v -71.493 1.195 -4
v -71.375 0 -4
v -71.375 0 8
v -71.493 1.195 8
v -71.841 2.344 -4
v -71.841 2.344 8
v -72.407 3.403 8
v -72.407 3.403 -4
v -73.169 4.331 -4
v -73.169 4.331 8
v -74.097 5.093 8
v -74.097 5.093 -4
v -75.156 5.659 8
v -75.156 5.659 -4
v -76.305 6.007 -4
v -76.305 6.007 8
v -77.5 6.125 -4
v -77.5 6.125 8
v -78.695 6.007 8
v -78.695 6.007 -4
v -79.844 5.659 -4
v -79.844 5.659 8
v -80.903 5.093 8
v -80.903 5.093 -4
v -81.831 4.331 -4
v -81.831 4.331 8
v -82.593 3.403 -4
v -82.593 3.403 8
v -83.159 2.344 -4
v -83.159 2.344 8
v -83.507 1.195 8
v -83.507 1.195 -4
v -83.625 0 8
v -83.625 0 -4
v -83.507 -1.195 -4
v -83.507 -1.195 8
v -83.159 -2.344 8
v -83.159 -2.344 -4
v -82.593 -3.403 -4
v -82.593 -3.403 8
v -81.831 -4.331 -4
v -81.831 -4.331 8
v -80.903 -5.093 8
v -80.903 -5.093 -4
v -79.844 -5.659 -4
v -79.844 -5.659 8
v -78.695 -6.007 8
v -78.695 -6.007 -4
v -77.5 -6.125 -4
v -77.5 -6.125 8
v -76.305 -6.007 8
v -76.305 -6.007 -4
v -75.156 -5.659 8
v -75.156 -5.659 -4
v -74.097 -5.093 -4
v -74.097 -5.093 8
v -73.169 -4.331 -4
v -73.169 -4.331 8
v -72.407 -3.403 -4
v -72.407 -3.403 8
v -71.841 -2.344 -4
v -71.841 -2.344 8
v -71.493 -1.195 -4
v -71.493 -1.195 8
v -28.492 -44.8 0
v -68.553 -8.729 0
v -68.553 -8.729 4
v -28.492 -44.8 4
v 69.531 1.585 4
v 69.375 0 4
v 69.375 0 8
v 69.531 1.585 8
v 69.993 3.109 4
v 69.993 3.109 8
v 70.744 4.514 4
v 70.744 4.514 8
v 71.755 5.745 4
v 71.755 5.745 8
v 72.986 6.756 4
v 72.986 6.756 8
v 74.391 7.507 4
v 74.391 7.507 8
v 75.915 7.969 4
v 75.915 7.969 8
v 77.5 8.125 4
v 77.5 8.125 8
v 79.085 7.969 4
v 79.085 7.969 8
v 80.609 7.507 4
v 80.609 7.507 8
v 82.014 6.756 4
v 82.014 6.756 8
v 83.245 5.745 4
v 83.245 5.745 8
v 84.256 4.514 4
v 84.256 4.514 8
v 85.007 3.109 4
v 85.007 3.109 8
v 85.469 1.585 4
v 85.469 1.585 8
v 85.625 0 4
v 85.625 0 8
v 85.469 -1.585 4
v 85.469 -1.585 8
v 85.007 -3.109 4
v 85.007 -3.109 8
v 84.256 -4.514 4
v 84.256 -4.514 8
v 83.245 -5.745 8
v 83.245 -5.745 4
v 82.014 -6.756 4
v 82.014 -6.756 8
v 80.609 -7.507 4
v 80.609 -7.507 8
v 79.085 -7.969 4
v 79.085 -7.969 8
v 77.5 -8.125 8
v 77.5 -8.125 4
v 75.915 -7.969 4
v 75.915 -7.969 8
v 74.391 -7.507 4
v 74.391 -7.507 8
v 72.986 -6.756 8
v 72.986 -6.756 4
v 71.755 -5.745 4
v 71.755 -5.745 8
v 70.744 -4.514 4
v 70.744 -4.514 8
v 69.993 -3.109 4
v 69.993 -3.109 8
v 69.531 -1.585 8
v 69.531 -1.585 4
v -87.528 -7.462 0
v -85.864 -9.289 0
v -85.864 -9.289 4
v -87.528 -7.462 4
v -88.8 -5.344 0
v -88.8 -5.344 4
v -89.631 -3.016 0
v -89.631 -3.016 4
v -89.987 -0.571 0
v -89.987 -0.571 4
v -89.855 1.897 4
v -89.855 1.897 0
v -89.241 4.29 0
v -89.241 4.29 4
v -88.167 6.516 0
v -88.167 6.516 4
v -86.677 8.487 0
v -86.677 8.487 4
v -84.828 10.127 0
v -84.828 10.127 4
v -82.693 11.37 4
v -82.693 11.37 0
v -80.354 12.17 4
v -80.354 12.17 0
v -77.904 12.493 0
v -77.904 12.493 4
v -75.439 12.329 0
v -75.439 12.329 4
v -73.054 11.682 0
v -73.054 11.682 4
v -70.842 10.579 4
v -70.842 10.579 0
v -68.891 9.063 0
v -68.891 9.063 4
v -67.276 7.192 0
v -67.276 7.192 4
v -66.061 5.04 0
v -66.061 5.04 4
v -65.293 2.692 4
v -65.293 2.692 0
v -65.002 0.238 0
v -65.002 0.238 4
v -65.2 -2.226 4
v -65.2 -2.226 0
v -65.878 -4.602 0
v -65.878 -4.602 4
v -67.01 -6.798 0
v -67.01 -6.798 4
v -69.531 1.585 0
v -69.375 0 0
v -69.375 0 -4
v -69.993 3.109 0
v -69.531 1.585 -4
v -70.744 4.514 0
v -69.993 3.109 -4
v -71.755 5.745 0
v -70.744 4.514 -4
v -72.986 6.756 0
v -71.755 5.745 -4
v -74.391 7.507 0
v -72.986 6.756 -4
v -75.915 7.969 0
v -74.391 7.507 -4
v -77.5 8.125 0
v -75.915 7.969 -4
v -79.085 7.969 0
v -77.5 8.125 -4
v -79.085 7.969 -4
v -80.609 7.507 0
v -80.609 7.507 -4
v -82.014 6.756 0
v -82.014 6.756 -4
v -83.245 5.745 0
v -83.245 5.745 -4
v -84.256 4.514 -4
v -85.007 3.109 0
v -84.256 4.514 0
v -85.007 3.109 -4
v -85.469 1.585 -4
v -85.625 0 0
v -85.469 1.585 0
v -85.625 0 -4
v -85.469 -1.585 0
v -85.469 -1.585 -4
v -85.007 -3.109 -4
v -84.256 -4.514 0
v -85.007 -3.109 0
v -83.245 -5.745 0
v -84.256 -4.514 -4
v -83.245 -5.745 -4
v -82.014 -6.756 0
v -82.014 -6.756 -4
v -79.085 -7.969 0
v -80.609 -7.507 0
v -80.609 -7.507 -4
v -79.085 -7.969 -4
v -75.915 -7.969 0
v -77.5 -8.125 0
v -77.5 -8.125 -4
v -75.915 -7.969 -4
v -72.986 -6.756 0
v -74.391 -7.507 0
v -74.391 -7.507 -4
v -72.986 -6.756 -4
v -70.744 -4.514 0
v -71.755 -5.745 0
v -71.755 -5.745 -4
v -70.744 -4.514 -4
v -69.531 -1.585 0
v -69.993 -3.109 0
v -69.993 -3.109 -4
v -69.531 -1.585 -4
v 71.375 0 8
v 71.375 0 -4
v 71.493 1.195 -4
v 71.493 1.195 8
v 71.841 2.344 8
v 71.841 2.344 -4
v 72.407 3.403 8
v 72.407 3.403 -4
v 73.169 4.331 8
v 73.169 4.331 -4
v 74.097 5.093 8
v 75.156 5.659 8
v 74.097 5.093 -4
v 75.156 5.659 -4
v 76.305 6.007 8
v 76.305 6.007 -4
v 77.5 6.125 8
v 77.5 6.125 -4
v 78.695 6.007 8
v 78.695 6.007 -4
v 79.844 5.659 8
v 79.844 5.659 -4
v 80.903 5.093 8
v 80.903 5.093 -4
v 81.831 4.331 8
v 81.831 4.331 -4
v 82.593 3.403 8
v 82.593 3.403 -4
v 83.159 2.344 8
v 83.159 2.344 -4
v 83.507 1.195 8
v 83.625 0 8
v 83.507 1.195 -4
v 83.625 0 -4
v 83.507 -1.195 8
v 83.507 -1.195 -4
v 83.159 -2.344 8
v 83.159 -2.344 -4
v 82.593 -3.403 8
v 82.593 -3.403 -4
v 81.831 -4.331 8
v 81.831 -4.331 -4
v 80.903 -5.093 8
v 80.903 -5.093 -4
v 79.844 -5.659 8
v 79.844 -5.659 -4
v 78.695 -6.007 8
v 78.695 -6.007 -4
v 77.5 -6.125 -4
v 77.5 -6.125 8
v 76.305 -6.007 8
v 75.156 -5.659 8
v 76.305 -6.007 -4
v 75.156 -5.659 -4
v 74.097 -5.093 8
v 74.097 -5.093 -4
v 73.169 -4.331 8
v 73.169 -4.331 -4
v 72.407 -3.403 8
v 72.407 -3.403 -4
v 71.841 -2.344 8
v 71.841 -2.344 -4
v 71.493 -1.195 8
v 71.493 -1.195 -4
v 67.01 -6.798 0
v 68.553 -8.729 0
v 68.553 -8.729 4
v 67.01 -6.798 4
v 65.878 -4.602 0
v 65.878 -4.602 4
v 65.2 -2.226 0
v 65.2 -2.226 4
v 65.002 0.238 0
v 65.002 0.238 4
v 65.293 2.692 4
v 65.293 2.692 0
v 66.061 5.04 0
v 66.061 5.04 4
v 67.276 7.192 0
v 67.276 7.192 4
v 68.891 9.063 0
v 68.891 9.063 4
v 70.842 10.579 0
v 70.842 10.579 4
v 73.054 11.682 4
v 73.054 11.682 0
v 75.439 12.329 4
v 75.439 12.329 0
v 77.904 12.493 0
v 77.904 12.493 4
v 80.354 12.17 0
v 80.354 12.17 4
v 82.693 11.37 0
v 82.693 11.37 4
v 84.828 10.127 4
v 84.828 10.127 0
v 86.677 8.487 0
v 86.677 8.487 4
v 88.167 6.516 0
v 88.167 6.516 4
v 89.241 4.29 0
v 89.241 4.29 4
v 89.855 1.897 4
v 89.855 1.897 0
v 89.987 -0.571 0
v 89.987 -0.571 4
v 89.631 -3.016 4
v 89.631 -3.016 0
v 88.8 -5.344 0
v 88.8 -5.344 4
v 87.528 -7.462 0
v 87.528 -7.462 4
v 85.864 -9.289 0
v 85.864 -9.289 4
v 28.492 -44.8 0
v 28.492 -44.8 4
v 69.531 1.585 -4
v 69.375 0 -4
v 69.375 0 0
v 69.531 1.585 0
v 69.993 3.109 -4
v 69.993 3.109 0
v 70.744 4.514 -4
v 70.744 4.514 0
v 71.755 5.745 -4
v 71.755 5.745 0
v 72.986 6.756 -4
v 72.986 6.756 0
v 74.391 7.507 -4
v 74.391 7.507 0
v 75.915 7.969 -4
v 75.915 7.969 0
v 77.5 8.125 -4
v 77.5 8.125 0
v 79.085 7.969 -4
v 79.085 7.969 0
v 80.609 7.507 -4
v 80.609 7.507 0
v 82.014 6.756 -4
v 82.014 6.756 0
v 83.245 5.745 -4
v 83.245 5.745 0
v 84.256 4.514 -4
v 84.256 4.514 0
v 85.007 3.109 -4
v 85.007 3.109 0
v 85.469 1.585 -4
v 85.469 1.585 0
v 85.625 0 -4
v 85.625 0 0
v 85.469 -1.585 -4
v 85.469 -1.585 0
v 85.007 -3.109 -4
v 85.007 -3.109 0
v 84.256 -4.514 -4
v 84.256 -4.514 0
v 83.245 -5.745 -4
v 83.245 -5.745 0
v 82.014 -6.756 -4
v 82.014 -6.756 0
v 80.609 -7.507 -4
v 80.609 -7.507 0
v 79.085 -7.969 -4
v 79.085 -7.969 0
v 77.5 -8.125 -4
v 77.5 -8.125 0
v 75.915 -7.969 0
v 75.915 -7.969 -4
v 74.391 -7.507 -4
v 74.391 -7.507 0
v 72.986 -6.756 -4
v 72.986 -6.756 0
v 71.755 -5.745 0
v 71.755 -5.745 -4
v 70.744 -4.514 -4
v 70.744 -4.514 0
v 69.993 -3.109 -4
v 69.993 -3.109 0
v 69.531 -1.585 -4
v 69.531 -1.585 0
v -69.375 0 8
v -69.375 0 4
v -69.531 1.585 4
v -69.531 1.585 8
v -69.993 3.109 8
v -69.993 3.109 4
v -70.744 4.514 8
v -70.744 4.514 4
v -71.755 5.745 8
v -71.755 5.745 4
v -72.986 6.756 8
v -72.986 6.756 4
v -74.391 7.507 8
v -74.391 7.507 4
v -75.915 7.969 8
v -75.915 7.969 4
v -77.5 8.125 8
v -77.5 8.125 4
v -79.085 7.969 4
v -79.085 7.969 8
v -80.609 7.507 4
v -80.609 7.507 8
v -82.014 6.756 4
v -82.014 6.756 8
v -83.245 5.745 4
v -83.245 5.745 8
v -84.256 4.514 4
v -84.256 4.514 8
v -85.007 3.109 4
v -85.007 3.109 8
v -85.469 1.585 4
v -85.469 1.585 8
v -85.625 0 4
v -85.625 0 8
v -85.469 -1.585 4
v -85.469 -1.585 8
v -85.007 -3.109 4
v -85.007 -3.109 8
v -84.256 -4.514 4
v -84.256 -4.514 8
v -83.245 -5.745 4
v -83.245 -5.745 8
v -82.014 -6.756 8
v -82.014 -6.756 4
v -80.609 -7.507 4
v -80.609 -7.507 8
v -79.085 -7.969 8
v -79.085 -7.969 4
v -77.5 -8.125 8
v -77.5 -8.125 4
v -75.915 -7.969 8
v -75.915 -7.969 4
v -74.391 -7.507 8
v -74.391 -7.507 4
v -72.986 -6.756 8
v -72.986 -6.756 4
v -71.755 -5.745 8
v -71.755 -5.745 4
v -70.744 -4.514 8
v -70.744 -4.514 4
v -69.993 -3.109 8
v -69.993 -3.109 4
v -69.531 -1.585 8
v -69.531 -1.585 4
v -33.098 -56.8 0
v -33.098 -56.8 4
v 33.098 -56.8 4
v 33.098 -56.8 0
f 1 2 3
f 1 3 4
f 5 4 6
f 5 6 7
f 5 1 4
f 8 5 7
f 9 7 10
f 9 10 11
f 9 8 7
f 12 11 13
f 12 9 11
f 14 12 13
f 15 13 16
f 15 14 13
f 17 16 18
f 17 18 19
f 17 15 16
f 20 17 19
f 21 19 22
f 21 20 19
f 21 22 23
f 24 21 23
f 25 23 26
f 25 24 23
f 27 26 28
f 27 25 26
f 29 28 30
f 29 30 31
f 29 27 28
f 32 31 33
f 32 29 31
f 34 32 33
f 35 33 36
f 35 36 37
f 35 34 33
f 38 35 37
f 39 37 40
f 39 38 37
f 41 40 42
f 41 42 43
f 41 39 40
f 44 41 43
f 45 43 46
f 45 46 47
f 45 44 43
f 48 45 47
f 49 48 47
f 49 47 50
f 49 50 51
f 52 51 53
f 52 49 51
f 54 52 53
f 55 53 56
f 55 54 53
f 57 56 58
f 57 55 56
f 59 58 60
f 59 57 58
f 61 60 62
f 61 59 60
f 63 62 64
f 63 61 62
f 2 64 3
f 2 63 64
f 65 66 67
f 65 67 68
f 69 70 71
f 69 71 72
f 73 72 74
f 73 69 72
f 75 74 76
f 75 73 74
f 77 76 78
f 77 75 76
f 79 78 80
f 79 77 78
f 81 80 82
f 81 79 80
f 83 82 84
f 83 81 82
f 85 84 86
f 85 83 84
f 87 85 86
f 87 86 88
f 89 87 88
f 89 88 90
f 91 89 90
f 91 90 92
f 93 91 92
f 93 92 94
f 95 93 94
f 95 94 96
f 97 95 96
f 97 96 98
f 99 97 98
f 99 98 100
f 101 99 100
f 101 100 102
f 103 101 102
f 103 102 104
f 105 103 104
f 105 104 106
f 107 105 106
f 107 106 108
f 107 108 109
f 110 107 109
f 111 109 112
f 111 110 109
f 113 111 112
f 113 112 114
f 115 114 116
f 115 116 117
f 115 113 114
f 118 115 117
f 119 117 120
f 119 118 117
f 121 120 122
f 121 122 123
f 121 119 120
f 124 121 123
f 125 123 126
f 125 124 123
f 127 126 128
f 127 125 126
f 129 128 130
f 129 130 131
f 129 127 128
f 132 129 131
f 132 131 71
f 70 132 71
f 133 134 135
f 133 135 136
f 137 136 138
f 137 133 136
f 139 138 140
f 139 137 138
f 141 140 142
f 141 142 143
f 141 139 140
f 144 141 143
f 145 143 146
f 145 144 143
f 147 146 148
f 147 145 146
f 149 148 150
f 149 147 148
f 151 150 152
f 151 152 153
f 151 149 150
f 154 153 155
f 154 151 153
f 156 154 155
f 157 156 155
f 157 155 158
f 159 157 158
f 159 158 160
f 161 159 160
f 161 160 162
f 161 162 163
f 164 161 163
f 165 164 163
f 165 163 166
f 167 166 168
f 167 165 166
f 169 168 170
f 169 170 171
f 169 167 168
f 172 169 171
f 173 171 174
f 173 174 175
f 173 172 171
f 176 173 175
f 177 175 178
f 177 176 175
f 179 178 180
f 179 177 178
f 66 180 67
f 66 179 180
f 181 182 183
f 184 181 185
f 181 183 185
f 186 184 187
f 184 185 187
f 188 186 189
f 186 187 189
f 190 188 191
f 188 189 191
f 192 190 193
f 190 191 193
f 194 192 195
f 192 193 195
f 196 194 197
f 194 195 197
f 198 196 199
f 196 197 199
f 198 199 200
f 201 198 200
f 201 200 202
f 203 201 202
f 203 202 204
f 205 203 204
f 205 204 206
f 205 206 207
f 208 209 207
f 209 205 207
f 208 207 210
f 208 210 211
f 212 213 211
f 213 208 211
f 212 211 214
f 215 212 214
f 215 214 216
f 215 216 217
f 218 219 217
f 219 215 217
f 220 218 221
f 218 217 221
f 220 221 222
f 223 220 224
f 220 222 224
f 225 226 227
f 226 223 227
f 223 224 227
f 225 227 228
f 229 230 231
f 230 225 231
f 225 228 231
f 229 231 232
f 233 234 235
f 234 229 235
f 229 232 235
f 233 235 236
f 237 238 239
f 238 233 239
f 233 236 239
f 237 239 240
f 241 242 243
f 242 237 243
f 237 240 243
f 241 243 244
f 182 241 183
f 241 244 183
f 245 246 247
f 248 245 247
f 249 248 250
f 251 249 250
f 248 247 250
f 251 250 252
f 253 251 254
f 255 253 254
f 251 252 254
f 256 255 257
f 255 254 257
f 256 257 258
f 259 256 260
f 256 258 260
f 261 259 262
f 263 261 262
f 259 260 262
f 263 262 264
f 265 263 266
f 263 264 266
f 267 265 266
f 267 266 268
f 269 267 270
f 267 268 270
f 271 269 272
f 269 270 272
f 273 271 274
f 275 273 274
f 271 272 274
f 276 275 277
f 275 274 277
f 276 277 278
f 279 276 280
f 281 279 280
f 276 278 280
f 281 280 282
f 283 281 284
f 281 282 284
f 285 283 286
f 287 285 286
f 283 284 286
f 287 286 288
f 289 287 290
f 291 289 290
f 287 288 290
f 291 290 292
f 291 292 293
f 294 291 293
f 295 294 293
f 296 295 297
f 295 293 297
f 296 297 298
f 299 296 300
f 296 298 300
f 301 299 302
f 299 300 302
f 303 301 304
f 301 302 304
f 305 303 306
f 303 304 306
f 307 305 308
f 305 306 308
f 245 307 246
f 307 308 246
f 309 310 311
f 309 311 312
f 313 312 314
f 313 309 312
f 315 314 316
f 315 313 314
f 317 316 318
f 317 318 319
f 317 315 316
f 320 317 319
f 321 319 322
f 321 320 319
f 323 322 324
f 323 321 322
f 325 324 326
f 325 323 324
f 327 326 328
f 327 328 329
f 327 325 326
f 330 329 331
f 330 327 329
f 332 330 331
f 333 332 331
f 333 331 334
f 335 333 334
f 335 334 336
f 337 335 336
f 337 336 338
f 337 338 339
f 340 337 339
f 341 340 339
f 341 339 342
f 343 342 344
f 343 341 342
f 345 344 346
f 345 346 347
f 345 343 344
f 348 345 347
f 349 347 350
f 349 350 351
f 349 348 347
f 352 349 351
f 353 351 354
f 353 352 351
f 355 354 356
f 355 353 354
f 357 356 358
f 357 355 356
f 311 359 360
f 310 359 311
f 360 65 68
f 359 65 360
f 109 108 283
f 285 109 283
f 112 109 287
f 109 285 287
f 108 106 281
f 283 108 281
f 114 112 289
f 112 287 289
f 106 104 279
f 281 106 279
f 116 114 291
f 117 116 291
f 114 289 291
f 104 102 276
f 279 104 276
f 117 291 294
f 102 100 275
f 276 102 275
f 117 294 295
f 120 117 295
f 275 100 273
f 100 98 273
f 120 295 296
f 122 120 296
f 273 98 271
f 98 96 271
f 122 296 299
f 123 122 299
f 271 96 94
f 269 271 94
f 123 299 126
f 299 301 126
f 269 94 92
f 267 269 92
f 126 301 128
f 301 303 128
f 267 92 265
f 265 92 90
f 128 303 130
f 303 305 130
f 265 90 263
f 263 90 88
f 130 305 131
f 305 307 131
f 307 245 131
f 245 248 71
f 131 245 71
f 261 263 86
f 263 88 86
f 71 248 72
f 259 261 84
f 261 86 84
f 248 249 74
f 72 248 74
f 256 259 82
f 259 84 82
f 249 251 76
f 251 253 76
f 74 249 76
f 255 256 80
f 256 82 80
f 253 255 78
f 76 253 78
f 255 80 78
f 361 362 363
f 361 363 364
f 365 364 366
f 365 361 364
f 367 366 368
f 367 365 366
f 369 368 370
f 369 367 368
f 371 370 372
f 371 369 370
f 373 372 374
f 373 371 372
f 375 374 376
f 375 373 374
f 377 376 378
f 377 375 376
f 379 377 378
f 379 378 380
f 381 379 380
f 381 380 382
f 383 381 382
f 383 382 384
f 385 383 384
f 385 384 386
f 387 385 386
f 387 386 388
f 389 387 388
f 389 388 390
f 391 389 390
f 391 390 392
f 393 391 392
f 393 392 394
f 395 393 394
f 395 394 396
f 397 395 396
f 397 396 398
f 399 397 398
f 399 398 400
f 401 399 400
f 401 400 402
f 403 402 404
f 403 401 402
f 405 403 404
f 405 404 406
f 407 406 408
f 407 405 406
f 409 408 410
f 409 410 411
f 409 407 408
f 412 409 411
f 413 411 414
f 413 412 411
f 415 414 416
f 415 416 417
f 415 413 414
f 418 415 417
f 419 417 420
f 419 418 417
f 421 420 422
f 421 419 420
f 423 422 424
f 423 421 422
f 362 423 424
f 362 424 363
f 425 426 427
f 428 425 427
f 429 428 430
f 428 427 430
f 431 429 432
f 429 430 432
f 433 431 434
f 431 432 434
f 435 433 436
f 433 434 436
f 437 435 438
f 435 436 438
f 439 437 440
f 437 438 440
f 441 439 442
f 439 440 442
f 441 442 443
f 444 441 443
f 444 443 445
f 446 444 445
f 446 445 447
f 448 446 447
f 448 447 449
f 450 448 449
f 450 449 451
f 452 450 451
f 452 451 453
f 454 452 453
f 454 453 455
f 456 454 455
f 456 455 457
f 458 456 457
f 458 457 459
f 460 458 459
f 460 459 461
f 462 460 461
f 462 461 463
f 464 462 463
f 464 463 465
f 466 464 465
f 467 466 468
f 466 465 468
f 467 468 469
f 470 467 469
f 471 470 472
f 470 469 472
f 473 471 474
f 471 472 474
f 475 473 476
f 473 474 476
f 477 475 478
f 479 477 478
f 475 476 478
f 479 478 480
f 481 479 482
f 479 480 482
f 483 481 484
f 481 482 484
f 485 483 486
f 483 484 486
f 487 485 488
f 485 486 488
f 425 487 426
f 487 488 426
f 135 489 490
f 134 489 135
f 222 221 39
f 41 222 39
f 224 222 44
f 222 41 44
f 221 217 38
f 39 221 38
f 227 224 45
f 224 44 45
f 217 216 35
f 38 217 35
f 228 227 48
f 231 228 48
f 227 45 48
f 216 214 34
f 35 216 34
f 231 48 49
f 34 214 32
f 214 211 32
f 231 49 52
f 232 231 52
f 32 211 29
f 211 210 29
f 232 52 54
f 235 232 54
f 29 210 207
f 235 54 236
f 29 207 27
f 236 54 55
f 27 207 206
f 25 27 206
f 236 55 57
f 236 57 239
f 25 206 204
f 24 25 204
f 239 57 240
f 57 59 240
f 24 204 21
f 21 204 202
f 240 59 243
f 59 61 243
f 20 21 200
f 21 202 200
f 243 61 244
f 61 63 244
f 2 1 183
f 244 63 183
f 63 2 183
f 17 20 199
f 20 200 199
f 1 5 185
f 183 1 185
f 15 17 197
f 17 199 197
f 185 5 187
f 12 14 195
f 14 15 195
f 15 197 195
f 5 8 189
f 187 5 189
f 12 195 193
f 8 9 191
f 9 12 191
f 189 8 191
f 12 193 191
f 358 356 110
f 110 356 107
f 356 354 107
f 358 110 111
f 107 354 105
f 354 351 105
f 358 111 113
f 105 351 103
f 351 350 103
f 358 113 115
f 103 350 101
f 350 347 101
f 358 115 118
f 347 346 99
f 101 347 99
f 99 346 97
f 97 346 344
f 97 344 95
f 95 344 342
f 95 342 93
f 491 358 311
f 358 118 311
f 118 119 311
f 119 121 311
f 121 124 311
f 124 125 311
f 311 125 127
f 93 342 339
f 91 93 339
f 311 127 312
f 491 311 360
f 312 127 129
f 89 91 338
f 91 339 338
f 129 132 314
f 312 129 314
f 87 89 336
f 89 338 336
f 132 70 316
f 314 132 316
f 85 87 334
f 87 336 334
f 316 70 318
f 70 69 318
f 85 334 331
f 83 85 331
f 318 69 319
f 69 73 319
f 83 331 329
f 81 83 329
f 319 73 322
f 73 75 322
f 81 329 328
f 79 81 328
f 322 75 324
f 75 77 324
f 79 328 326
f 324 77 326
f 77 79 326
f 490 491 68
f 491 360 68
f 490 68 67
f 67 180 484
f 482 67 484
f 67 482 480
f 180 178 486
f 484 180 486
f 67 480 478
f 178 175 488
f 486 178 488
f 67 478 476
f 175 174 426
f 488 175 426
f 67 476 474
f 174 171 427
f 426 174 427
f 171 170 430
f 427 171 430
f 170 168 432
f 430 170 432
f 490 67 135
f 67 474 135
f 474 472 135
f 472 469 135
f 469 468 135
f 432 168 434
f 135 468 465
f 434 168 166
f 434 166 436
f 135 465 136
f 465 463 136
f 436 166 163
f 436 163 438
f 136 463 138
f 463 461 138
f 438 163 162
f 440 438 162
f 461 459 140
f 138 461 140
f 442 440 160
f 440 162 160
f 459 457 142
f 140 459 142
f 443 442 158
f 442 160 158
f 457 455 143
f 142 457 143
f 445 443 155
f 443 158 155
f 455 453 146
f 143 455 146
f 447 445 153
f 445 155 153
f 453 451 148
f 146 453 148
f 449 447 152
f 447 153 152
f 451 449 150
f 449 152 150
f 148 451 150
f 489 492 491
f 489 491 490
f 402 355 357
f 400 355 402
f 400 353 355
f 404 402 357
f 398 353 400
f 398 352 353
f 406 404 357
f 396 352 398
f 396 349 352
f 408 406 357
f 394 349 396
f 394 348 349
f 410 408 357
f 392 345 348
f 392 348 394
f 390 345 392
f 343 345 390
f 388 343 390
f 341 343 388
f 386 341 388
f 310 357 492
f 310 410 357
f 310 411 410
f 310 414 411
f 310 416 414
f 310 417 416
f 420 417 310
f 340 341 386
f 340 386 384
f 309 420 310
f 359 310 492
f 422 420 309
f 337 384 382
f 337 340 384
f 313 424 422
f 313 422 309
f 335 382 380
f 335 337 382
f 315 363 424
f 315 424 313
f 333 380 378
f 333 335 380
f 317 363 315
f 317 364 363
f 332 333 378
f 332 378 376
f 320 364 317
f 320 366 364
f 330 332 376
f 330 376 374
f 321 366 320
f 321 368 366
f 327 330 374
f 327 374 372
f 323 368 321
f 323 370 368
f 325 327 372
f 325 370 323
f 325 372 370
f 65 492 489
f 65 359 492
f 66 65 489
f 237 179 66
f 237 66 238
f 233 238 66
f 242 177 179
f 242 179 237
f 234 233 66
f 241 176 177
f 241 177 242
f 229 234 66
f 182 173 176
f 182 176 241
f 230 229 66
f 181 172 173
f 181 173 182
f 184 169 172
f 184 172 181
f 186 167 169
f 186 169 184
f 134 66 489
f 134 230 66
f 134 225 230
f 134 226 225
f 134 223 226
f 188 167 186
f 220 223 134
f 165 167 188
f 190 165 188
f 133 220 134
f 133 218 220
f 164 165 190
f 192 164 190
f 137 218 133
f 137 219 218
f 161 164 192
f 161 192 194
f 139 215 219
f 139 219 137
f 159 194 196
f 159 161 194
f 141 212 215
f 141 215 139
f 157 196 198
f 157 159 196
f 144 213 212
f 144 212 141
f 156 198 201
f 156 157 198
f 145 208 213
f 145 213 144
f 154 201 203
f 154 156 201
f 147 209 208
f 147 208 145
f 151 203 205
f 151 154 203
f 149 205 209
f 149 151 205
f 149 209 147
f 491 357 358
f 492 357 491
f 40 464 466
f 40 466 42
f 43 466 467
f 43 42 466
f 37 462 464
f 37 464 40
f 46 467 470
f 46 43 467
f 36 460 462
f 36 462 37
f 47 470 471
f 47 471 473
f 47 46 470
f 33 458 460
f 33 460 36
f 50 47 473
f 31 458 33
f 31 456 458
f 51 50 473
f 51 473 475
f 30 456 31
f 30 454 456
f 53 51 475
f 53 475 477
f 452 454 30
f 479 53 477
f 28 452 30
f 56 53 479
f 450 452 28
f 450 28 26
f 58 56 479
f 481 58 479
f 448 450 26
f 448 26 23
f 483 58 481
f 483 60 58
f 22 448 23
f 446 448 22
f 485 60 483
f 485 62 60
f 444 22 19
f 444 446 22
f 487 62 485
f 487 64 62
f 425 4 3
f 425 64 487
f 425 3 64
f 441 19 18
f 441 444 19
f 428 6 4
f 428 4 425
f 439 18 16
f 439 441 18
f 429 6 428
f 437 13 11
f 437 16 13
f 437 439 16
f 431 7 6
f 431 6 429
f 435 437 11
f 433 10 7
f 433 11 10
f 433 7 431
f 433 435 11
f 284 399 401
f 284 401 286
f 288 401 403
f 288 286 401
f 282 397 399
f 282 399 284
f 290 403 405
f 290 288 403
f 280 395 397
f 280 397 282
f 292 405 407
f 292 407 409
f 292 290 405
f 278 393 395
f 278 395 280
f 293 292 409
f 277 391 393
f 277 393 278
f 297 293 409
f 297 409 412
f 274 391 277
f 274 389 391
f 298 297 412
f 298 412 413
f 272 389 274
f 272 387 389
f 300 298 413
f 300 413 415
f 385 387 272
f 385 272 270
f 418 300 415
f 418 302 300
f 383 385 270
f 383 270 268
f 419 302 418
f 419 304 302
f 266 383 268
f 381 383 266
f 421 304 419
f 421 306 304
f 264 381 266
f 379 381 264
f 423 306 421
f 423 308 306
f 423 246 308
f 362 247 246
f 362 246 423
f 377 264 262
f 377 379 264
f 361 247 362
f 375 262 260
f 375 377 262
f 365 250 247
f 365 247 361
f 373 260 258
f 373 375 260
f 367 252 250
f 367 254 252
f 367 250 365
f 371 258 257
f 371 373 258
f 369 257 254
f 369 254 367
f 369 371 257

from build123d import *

# Parameters (mm, degrees)
SKETCH1_R           = 6.25
BOSS_EXTRUDE1_DEPTH = 4
BOSS_EXTRUDE5_START = -8
SKETCH7_R           = 8.125
SKETCH7_R_2         = 6.125
BOSS_EXTRUDE5_DEPTH = 12


with BuildPart() as part:
    # Sketch1 → Boss-Extrude1 (new body)
    with BuildSketch(Plane.XY):
        with BuildLine():
            Line((85.864132579, -9.289310318), (33.098166031, -56.8))
            Line((33.098166031, -56.8), (-33.098166031, -56.8))
            Line((-33.098166031, -56.8), (-85.864132579, -9.289310318))
            ThreePointArc((-85.864132579, -9.289310318), (-77.904361198, 12.493457969), (-68.552689408, -8.729011007))
            Line((-68.552689408, -8.729011007), (-28.491797611, -44.8))
            Line((-28.491797611, -44.8), (28.491797611, -44.8))
            Line((28.491797611, -44.8), (68.552689408, -8.729011007))
            ThreePointArc((68.552689408, -8.729011007), (77.904361198, 12.493457969), (85.864132579, -9.289310318))
        make_face()
        with Locations((-77.5, 0)):
            Circle(SKETCH1_R, mode=Mode.SUBTRACT)
        with Locations((77.5, 0)):
            Circle(SKETCH1_R, mode=Mode.SUBTRACT)
    extrude(amount=BOSS_EXTRUDE1_DEPTH)

    # Sketch7 → Boss-Extrude5 (add)
    with BuildSketch(Plane.XY.offset(4).offset(BOSS_EXTRUDE5_START)):
        with Locations((-77.5, 0)):
            Circle(SKETCH7_R)
        with Locations((-77.5, 0)):
            Circle(SKETCH7_R_2, mode=Mode.SUBTRACT)
    boss_extrude5 = extrude(amount=BOSS_EXTRUDE5_DEPTH)

    # Mirror1: Boss-Extrude5 across plane
    add(boss_extrude5.mirror(Plane(origin=(0, 0, 0), x_dir=(0, 0, 1), z_dir=(1, 0, 0))))


solid = part.part
